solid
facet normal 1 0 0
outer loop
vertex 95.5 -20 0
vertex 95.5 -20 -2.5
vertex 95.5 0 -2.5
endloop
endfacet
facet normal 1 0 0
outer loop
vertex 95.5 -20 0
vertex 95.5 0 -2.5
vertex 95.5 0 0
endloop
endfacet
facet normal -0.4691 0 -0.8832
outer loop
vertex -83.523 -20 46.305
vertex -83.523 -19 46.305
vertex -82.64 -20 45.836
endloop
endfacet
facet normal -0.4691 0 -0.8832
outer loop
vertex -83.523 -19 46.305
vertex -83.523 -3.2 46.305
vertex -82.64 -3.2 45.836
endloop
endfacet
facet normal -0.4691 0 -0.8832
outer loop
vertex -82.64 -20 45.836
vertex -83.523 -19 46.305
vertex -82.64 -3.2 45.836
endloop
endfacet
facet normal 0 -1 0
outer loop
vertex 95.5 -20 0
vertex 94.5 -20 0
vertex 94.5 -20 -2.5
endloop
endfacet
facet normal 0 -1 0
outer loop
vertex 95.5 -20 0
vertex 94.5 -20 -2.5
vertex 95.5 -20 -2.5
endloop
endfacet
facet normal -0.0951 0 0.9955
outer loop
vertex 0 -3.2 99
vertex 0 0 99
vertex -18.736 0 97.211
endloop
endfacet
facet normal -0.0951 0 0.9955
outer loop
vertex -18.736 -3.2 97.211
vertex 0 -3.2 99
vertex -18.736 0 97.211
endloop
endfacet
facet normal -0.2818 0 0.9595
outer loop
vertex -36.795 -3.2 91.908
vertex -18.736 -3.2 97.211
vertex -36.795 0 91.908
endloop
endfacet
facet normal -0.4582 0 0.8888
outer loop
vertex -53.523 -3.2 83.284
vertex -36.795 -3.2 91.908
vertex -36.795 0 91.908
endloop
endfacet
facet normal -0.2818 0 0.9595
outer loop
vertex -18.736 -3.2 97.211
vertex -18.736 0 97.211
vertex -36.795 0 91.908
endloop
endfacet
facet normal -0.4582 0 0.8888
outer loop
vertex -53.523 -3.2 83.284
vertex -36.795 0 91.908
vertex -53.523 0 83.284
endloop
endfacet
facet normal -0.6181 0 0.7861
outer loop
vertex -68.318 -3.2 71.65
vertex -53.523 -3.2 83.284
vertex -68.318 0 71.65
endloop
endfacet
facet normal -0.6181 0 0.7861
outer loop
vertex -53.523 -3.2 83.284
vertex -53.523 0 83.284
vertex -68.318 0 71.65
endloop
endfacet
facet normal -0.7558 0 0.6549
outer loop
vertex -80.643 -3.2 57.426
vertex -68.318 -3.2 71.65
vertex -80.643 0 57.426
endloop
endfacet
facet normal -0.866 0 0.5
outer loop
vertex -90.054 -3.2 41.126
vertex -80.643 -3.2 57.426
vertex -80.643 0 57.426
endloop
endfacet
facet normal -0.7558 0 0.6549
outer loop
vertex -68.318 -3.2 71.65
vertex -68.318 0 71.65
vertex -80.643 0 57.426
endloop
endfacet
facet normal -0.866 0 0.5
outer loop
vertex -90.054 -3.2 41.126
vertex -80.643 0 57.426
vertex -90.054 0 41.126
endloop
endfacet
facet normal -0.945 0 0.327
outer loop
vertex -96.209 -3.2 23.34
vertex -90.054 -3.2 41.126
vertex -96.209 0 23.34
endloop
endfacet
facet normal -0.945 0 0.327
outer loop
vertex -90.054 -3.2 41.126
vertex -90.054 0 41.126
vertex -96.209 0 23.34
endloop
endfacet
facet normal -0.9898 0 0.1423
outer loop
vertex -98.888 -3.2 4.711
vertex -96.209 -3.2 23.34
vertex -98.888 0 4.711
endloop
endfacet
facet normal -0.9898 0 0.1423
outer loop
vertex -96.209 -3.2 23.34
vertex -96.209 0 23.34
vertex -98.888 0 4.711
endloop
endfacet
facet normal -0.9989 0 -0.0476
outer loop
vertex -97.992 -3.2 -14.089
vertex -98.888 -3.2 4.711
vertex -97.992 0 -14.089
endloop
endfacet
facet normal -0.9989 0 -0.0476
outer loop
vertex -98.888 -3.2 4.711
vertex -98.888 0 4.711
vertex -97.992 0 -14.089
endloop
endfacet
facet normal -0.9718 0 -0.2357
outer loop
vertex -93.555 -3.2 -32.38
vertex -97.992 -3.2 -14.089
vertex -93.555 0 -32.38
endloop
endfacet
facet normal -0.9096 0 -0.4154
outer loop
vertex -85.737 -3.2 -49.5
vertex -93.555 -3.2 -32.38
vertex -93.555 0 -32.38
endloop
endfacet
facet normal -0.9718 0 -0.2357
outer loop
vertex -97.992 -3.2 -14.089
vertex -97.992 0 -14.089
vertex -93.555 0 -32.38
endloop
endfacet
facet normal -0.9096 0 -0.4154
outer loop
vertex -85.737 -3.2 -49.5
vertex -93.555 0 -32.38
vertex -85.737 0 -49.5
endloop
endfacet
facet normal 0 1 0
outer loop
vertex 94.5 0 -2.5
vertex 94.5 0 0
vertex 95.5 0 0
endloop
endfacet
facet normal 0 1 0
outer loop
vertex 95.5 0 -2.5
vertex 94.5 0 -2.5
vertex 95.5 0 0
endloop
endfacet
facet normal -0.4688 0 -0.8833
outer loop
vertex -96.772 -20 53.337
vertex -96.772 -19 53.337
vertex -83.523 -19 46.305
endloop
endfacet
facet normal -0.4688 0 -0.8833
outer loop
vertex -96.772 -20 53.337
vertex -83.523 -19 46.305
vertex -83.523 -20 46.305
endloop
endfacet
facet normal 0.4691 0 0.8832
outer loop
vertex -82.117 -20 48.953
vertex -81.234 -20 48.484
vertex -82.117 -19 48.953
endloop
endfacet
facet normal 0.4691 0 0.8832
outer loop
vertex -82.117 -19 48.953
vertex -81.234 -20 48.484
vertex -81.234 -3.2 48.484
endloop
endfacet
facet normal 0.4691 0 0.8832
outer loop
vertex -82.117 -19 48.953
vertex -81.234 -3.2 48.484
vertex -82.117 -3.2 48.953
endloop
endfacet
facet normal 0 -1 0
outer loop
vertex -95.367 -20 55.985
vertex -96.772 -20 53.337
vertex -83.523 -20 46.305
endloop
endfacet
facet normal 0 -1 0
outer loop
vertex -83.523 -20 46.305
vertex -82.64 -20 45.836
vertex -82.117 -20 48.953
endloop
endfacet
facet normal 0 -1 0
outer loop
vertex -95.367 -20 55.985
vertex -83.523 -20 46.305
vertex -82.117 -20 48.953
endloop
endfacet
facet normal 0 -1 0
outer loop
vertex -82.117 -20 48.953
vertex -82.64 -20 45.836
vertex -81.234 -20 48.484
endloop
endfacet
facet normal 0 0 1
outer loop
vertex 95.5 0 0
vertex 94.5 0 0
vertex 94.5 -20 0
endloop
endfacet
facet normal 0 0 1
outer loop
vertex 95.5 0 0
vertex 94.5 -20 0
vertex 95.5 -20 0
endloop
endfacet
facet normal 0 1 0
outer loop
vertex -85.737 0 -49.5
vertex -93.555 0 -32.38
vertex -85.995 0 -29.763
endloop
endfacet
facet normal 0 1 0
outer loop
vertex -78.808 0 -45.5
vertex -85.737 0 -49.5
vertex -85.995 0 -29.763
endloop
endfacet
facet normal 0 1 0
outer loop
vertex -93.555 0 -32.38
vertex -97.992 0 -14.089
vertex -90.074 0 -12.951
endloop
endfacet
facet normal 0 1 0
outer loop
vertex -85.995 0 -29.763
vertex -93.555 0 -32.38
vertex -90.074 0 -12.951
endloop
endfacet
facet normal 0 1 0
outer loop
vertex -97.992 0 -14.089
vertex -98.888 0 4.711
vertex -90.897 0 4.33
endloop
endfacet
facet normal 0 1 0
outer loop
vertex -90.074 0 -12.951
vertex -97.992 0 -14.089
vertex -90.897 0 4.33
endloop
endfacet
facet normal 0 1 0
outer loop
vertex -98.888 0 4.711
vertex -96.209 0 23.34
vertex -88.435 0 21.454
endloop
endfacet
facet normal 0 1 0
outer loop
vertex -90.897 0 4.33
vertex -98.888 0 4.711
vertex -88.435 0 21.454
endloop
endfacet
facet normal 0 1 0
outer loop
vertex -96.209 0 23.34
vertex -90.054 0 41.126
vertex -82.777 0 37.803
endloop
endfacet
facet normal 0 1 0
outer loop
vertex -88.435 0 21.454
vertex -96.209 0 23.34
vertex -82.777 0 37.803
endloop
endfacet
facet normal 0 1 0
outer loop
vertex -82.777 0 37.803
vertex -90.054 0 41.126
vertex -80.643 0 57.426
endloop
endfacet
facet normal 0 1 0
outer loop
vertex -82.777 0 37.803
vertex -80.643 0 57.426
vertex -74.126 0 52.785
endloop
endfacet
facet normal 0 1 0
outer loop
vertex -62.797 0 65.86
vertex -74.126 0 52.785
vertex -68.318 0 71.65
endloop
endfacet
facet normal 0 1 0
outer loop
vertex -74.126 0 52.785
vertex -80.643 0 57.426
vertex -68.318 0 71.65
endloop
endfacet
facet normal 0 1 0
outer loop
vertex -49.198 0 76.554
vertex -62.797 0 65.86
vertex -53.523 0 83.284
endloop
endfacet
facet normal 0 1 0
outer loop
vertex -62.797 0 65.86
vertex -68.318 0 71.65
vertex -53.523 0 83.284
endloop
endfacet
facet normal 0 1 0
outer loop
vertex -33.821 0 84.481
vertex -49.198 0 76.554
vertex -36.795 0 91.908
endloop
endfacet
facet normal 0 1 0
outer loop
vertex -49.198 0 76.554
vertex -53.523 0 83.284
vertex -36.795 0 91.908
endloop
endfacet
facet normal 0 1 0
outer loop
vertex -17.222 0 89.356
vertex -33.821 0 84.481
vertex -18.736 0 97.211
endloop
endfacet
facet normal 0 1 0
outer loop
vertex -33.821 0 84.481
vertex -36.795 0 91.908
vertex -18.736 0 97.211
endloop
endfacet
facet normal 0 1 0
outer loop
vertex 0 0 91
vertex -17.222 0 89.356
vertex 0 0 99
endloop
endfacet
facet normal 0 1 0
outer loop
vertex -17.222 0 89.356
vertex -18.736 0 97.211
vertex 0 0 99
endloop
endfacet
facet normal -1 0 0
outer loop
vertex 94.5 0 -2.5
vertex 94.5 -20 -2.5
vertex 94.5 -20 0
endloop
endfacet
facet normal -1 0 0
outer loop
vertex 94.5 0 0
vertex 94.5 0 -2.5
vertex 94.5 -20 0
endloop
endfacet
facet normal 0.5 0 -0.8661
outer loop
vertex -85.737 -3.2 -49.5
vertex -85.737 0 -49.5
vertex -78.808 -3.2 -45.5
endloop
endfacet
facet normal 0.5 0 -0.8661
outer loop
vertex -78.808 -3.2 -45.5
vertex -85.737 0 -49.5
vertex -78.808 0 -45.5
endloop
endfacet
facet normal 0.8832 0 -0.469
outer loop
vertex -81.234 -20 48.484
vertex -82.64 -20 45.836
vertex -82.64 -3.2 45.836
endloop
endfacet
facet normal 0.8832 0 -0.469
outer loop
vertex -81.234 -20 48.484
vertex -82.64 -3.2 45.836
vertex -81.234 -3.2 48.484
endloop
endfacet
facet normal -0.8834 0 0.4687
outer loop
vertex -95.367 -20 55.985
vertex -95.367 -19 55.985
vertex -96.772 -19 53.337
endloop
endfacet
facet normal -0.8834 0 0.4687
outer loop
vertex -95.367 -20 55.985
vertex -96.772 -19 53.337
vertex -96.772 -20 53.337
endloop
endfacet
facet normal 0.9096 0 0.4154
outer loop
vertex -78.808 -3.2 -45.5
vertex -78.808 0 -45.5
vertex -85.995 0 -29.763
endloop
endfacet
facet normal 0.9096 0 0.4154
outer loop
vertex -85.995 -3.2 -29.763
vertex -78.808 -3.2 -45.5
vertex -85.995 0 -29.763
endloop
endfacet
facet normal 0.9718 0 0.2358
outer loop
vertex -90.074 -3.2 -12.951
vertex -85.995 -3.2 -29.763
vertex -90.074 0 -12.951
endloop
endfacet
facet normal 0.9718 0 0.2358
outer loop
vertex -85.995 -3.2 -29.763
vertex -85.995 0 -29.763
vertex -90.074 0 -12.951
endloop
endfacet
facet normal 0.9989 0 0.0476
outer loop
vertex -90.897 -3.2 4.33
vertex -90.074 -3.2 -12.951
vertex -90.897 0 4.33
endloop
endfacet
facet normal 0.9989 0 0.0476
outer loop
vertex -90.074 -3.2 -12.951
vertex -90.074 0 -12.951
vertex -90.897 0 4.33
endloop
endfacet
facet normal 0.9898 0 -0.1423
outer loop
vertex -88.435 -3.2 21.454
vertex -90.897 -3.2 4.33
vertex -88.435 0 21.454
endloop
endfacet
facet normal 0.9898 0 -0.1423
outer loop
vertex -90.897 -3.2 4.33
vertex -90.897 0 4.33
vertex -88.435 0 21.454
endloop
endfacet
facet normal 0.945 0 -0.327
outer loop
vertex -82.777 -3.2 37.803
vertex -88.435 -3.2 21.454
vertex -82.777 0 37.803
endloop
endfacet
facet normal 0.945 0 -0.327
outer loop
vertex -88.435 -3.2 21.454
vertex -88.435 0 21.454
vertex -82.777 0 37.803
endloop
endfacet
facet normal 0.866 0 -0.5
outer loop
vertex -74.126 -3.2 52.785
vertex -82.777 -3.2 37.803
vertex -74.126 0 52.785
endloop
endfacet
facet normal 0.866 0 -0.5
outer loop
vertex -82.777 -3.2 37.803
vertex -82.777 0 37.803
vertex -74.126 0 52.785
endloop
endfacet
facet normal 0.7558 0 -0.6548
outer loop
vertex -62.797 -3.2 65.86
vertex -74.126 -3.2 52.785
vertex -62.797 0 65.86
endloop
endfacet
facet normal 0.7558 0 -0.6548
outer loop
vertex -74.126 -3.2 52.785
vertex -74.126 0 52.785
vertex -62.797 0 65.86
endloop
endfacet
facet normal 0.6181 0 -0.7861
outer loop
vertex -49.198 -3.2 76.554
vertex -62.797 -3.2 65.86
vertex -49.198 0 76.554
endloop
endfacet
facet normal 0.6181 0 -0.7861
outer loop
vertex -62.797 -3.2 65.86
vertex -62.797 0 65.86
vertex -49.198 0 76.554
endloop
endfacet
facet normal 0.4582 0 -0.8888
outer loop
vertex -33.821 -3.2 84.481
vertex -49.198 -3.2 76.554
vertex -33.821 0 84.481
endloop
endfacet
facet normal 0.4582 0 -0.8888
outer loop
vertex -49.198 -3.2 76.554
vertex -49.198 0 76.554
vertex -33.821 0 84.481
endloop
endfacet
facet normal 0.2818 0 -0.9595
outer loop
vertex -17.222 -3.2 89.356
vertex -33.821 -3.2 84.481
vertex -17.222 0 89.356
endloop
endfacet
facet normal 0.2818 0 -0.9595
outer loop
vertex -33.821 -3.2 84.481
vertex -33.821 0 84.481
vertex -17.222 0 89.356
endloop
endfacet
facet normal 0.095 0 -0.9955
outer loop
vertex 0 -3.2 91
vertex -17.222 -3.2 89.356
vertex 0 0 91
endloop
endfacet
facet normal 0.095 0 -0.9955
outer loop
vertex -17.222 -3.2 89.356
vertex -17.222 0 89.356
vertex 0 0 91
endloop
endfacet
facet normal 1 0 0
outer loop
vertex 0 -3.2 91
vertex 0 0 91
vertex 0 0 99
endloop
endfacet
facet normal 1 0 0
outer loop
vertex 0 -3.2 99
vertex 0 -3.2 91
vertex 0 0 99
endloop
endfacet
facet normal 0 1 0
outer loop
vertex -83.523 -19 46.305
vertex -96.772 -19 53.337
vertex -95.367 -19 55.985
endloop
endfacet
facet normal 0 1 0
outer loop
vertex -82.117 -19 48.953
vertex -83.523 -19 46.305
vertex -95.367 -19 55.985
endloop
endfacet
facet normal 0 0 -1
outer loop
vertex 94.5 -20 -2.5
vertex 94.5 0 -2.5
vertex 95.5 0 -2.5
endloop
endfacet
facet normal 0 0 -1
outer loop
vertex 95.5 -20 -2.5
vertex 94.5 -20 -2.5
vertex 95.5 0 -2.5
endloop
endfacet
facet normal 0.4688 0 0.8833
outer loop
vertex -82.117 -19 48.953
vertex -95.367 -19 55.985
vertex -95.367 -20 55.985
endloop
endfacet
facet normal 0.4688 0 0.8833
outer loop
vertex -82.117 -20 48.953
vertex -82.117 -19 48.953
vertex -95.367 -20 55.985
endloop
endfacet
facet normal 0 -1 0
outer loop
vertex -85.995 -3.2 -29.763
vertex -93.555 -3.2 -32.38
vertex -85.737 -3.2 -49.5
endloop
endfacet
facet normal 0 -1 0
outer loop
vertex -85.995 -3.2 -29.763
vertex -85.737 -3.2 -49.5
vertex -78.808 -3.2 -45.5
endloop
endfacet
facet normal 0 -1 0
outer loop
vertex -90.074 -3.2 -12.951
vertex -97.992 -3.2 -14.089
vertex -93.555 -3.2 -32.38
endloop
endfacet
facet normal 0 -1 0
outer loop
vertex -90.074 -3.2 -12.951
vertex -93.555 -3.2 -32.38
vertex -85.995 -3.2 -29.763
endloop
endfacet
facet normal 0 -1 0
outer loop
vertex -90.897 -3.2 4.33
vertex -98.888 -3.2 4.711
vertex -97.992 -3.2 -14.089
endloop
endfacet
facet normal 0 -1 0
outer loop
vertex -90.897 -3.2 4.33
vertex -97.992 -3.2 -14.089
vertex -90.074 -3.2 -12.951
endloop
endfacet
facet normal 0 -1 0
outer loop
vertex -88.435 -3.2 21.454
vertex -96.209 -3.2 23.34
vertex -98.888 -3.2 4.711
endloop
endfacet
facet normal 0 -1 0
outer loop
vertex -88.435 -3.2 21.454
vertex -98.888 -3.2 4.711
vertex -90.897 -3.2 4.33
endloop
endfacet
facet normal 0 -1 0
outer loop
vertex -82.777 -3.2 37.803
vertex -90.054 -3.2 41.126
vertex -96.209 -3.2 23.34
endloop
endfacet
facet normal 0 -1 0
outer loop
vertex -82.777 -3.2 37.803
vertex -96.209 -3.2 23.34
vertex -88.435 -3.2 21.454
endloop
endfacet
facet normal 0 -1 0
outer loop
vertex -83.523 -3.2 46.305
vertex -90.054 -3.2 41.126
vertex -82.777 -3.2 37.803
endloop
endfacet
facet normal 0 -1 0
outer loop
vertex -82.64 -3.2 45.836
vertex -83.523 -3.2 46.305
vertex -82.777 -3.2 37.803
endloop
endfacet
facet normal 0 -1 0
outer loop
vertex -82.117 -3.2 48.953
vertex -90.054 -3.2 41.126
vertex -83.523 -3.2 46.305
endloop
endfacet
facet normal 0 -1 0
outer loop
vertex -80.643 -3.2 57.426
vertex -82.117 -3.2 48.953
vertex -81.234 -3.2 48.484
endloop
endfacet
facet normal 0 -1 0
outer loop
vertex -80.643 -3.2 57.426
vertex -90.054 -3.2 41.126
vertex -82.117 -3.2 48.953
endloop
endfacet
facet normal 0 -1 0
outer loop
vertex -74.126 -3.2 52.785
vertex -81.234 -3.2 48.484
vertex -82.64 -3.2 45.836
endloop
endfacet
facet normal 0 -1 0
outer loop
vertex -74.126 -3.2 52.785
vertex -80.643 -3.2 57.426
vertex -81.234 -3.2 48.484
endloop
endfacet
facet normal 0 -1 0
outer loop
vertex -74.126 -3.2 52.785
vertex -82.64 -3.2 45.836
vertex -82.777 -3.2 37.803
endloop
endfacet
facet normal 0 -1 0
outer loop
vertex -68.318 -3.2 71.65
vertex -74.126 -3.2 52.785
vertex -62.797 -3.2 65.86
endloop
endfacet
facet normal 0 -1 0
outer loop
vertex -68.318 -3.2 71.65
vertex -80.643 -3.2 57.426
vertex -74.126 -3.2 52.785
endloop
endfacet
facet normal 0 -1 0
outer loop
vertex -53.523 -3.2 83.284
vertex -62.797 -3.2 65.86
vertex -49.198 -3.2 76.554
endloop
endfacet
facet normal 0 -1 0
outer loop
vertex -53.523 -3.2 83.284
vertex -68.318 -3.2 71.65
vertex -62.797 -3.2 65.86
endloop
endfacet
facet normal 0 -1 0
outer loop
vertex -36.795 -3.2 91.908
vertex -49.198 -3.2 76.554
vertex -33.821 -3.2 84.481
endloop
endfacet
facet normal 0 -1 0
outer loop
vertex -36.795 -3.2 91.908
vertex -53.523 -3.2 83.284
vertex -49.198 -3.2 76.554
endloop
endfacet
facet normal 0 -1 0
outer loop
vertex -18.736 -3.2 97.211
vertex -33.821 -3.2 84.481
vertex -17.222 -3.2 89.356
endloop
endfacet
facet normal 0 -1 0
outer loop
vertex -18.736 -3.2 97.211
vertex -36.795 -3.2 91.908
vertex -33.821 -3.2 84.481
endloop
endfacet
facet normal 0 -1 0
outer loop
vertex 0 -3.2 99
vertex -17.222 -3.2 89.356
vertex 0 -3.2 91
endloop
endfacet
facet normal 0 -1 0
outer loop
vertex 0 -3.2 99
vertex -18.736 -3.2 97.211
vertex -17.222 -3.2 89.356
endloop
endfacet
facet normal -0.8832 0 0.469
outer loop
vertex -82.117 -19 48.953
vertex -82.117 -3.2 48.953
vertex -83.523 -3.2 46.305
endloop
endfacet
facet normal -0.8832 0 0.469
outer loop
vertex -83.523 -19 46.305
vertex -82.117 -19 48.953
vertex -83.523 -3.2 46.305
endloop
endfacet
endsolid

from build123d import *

# Parameters (mm, degrees)
F1_DEPTH = 3.2
F2_W     = 1
F2_H     = 2.5
F3_DEPTH = 20
F4_W     = 1
F4_H     = 2.9982167683
F5_DEPTH = 15


with BuildPart() as f1:
    # F0 (on Front) → F1 (new body)
    with BuildSketch(Plane.XZ):
        with BuildLine():
            ThreePointArc((-78.8083117444, -45.5), (-78.8083117444, 45.5), (0, 91))
            Line((0, 91), (0, 99))
            ThreePointArc((0, 99), (-85.7365149747, 49.5), (-85.7365149747, -49.5))
            Line((-85.7365149747, -49.5), (-78.8083117444, -45.5))
        make_face()
    extrude(amount=F1_DEPTH)

    # F2 (on Front) → F3, piece 2 (join)
    with BuildSketch(Plane.XZ):
        Polygon((-83.0814379502, 46.0702641866), (-82.6397805765, 45.83587399), (-81.2341670322, 48.4841293343), (-82.1174584818, 48.9529536219), (-83.5230953239, 46.3046543832), align=None)
    extrude(amount=F3_DEPTH)

    # F4 (on face) → F5 (join)
    with BuildSketch(Plane(origin=(-84.3401855631, 0, 44.7652102012), x_dir=(0, -1, 0), z_dir=(-0.8832914507, 0, 0.4688242881))):
        with Locations((19.5, 3.2419580186)):
            Rectangle(F4_W, F4_H)
    extrude(amount=F5_DEPTH)


with BuildPart() as f3:
    # F2 (on Front) → F3 (new body)
    with BuildSketch(Plane.XZ):
        with Locations((95, -1.25)):
            Rectangle(F2_W, F2_H)
    extrude(amount=F3_DEPTH)


solid = Compound([f1.part, f3.part])
